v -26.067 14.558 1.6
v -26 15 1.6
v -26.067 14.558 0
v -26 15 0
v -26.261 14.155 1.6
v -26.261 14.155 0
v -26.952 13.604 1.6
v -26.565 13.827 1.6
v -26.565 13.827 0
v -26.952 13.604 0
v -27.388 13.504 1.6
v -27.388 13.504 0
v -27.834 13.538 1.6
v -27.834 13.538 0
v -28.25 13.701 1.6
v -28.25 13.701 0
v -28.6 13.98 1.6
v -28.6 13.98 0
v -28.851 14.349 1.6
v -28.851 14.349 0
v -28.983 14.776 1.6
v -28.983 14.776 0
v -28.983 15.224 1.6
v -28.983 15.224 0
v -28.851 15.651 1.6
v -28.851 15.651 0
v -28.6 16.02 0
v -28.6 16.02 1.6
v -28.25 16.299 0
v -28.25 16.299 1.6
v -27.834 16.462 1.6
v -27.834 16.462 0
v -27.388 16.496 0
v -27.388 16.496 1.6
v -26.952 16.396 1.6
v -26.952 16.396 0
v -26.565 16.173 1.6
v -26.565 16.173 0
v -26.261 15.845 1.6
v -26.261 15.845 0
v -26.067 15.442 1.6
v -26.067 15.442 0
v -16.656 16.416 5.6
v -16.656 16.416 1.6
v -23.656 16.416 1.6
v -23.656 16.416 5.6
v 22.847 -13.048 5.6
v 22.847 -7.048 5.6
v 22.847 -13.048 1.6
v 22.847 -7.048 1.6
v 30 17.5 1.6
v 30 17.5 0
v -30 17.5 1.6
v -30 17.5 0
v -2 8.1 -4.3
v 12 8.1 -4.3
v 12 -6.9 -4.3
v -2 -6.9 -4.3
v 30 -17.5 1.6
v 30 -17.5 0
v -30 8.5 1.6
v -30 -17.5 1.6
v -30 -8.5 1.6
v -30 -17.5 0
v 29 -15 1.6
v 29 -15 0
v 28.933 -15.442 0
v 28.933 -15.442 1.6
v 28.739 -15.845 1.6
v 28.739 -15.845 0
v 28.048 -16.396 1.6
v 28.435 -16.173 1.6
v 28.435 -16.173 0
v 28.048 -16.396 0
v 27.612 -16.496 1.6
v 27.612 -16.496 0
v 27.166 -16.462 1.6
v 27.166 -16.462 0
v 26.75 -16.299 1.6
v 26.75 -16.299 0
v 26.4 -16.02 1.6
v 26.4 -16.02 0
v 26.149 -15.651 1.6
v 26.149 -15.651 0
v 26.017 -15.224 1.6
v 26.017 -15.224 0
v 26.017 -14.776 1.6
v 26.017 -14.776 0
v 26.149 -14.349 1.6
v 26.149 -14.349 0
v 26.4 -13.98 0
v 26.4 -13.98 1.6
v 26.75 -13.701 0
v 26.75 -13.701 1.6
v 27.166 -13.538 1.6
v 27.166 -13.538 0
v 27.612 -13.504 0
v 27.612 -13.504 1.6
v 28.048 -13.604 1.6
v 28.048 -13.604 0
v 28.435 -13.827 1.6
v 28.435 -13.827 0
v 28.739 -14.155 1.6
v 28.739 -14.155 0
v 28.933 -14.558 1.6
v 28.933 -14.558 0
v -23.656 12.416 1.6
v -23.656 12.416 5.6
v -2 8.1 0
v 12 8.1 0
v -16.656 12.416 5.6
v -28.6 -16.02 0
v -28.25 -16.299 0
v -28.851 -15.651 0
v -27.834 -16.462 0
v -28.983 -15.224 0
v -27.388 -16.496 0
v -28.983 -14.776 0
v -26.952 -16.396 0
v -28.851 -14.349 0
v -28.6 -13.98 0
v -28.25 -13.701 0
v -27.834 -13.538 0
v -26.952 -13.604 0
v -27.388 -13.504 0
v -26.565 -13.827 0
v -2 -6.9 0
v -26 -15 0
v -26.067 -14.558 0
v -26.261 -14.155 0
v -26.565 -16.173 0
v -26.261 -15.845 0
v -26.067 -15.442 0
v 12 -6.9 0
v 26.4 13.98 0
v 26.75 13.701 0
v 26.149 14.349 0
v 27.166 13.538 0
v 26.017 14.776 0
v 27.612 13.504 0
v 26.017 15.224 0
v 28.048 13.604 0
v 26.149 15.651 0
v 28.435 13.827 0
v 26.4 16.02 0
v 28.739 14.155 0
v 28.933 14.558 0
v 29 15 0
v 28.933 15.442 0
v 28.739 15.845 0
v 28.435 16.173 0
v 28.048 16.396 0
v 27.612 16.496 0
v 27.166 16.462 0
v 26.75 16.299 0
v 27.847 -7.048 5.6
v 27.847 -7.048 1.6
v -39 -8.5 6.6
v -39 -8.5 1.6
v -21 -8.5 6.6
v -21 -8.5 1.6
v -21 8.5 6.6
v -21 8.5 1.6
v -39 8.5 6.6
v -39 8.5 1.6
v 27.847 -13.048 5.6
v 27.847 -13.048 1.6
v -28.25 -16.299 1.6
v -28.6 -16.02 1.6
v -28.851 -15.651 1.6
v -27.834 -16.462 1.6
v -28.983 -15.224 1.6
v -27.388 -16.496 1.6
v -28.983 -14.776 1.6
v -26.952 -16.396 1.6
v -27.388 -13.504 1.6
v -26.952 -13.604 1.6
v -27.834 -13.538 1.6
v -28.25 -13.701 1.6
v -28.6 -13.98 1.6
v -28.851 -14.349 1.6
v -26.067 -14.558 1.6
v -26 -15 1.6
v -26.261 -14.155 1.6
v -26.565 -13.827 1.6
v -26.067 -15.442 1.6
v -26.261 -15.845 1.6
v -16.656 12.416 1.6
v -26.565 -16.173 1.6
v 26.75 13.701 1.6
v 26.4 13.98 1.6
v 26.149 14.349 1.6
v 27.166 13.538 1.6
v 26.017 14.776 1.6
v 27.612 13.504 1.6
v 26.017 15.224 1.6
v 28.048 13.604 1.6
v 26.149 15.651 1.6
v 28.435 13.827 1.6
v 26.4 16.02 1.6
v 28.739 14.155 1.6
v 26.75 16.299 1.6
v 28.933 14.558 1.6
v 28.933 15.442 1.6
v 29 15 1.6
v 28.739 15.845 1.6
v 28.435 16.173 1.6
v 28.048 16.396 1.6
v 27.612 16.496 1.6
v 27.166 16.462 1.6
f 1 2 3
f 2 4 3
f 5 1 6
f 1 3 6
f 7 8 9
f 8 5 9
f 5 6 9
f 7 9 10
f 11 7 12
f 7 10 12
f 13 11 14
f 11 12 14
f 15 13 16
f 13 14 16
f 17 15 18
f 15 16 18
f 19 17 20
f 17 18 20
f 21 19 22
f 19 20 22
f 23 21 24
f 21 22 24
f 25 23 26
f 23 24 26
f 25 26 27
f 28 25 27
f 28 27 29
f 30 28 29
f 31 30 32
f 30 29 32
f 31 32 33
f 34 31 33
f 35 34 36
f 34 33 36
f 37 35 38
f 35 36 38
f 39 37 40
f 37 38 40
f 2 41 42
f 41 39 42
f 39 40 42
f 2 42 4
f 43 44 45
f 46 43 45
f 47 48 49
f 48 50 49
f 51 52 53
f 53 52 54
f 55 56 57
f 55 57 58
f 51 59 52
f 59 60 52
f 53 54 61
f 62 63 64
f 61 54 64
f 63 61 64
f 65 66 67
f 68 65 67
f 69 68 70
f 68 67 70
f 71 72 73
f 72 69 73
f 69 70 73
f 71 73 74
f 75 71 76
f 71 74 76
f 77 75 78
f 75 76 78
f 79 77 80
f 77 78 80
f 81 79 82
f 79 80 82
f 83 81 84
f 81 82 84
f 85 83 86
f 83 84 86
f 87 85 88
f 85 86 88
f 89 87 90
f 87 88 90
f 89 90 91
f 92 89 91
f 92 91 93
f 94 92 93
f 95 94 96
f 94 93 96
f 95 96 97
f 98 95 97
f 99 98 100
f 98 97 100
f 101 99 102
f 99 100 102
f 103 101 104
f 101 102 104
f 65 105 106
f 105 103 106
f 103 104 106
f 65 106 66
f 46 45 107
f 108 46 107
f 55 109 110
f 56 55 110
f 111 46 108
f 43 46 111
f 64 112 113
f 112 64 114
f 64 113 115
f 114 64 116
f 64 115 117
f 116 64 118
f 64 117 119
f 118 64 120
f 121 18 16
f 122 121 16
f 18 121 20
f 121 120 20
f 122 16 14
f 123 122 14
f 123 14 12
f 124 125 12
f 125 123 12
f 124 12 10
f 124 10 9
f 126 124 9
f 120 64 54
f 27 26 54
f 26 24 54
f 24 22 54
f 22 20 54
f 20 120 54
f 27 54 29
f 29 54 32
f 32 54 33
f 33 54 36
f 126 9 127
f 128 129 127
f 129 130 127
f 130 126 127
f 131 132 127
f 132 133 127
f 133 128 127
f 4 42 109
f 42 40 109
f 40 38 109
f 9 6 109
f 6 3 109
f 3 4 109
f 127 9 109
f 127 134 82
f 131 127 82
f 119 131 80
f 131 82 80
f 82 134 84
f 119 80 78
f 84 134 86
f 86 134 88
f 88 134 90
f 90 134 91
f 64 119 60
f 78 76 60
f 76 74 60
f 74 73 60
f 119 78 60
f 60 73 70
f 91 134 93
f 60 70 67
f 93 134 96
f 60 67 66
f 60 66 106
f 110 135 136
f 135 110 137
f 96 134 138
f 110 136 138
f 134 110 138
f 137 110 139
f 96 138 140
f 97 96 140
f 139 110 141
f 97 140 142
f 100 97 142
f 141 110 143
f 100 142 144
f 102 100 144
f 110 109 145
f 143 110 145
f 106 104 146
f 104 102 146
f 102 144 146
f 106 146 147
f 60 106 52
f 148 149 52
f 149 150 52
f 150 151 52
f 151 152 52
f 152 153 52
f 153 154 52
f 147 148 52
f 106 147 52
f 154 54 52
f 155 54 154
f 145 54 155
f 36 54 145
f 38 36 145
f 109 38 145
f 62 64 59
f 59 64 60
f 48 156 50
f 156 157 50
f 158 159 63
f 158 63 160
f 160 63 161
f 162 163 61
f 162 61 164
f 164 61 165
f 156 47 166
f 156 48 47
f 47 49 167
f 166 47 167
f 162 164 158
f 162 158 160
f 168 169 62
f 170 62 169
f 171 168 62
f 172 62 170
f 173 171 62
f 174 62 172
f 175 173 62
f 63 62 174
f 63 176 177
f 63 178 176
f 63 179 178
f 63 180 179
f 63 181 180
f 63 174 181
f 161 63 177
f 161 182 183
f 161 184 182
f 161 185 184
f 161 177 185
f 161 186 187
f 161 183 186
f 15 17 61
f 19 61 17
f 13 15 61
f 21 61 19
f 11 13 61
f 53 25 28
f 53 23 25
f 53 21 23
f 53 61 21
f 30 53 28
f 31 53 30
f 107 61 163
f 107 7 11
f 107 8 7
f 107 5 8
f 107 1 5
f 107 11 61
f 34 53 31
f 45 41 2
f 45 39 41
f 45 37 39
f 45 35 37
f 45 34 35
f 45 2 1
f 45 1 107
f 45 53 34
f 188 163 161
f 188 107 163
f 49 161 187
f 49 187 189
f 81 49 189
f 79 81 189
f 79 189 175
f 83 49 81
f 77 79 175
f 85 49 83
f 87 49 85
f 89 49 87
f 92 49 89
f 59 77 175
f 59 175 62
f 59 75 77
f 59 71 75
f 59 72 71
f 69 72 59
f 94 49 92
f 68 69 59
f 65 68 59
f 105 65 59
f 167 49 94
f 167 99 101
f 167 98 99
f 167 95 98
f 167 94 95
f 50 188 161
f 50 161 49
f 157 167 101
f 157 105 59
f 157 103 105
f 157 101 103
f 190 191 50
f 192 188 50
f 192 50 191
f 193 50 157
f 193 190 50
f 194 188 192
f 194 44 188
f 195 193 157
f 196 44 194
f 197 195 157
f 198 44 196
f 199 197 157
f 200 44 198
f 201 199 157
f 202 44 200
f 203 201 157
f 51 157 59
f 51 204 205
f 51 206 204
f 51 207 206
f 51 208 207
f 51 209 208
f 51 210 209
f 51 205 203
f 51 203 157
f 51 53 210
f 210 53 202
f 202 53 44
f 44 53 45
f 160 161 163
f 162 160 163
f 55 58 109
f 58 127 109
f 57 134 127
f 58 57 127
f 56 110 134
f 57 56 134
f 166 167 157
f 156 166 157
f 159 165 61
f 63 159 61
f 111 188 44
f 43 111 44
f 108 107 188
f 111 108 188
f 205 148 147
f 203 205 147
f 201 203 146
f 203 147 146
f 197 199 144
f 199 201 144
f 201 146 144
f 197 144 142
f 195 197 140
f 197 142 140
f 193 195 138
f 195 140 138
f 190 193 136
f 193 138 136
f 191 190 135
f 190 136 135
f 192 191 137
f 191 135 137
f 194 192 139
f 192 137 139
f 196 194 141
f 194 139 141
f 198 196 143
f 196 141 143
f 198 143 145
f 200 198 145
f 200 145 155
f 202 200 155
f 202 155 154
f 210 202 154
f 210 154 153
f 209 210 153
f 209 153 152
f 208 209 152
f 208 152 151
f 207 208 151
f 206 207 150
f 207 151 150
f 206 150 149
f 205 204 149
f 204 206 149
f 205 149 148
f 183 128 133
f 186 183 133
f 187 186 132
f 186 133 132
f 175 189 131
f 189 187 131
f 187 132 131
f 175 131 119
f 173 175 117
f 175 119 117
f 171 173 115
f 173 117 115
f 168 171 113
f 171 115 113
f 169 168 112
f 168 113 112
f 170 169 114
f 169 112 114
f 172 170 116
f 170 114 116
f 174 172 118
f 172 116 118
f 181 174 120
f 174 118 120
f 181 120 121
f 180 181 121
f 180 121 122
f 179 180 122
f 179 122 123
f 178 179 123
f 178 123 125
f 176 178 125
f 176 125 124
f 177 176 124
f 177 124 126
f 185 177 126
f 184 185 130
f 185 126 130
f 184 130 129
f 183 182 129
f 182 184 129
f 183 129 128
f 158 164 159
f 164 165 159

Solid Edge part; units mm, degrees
sketch "Sketch1" plane through (0, 0, 0) normal (0, 0, 1) x (1, 0, 0)
  line L0 (-30, -17.5) -> (30, -17.5)
  line L1 (30, -17.5) -> (30, 17.5)
  line L2 (30, 17.5) -> (-30, 17.5)
  line L3 (-30, 17.5) -> (-30, -17.5)
  circle A0 centre (-27.5, -15) radius 1.5
  circle A1 centre (-27.5, 15) radius 1.5
  circle A2 centre (27.5, -15) radius 1.5
  circle A3 centre (27.5, 15) radius 1.5
  dimension "D1" = 60
  dimension "D2" = 35
  dimension "D3" = 55
  dimension "D4" = 30
  dimension "D5" = 3
extrude "Protrusion1" add sketch "Sketch1" along normal blind 1.6
sketch "Sketch2" plane through (0, 0, 1.6) normal (0, 0, 1) x (1, 0, 0)
  line L0 (-39, 8.5) -> (-39, -8.5)
  line L1 (-39, -8.5) -> (-21, -8.5)
  line L2 (-21, -8.5) -> (-21, 8.5)
  line L3 (-21, 8.5) -> (-39, 8.5)
extrude "ExtrudedProtrusion_2" add sketch "Sketch2" along normal blind 5
sketch "Sketch3" plane through (0, 0, 1.6) normal (0, 0, 1) x (1, 0, 0)
  line L0 (-23.6555, 12.416) -> (-16.6555, 12.416)
  line L1 (-16.6555, 12.416) -> (-16.6555, 16.416)
  line L2 (-16.6555, 16.416) -> (-23.6555, 16.416)
  line L3 (-23.6555, 16.416) -> (-23.6555, 12.416)
  line L4 (27.8474, -13.0476) -> (27.8474, -7.0476)
  line L5 (27.8474, -7.0476) -> (22.8474, -7.0476)
  line L6 (22.8474, -7.0476) -> (22.8474, -13.0476)
  line L7 (22.8474, -13.0476) -> (27.8474, -13.0476)
  dimension "D1" = 18
  dimension "D2" = 17
  dimension "D3" = 9
  dimension "D4" = 7
  dimension "D5" = 4
  dimension "D6" = 6
  dimension "D7" = 5
extrude "ExtrudedProtrusion_3" add sketch "Sketch3" along normal blind 4
sketch "Sketch4" plane through (0, 0, 0) normal (0, 0, -1) x (1, 0, 0)
  line L0 (12, 6.9) -> (-2, 6.9)
  line L1 (-2, 6.9) -> (-2, -8.1)
  line L2 (-2, -8.1) -> (12, -8.1)
  line L3 (12, -8.1) -> (12, 6.9)
extrude "ExtrudedProtrusion_4" add sketch "Sketch4" along normal blind 4.3
properties material "Polycarbonate"
